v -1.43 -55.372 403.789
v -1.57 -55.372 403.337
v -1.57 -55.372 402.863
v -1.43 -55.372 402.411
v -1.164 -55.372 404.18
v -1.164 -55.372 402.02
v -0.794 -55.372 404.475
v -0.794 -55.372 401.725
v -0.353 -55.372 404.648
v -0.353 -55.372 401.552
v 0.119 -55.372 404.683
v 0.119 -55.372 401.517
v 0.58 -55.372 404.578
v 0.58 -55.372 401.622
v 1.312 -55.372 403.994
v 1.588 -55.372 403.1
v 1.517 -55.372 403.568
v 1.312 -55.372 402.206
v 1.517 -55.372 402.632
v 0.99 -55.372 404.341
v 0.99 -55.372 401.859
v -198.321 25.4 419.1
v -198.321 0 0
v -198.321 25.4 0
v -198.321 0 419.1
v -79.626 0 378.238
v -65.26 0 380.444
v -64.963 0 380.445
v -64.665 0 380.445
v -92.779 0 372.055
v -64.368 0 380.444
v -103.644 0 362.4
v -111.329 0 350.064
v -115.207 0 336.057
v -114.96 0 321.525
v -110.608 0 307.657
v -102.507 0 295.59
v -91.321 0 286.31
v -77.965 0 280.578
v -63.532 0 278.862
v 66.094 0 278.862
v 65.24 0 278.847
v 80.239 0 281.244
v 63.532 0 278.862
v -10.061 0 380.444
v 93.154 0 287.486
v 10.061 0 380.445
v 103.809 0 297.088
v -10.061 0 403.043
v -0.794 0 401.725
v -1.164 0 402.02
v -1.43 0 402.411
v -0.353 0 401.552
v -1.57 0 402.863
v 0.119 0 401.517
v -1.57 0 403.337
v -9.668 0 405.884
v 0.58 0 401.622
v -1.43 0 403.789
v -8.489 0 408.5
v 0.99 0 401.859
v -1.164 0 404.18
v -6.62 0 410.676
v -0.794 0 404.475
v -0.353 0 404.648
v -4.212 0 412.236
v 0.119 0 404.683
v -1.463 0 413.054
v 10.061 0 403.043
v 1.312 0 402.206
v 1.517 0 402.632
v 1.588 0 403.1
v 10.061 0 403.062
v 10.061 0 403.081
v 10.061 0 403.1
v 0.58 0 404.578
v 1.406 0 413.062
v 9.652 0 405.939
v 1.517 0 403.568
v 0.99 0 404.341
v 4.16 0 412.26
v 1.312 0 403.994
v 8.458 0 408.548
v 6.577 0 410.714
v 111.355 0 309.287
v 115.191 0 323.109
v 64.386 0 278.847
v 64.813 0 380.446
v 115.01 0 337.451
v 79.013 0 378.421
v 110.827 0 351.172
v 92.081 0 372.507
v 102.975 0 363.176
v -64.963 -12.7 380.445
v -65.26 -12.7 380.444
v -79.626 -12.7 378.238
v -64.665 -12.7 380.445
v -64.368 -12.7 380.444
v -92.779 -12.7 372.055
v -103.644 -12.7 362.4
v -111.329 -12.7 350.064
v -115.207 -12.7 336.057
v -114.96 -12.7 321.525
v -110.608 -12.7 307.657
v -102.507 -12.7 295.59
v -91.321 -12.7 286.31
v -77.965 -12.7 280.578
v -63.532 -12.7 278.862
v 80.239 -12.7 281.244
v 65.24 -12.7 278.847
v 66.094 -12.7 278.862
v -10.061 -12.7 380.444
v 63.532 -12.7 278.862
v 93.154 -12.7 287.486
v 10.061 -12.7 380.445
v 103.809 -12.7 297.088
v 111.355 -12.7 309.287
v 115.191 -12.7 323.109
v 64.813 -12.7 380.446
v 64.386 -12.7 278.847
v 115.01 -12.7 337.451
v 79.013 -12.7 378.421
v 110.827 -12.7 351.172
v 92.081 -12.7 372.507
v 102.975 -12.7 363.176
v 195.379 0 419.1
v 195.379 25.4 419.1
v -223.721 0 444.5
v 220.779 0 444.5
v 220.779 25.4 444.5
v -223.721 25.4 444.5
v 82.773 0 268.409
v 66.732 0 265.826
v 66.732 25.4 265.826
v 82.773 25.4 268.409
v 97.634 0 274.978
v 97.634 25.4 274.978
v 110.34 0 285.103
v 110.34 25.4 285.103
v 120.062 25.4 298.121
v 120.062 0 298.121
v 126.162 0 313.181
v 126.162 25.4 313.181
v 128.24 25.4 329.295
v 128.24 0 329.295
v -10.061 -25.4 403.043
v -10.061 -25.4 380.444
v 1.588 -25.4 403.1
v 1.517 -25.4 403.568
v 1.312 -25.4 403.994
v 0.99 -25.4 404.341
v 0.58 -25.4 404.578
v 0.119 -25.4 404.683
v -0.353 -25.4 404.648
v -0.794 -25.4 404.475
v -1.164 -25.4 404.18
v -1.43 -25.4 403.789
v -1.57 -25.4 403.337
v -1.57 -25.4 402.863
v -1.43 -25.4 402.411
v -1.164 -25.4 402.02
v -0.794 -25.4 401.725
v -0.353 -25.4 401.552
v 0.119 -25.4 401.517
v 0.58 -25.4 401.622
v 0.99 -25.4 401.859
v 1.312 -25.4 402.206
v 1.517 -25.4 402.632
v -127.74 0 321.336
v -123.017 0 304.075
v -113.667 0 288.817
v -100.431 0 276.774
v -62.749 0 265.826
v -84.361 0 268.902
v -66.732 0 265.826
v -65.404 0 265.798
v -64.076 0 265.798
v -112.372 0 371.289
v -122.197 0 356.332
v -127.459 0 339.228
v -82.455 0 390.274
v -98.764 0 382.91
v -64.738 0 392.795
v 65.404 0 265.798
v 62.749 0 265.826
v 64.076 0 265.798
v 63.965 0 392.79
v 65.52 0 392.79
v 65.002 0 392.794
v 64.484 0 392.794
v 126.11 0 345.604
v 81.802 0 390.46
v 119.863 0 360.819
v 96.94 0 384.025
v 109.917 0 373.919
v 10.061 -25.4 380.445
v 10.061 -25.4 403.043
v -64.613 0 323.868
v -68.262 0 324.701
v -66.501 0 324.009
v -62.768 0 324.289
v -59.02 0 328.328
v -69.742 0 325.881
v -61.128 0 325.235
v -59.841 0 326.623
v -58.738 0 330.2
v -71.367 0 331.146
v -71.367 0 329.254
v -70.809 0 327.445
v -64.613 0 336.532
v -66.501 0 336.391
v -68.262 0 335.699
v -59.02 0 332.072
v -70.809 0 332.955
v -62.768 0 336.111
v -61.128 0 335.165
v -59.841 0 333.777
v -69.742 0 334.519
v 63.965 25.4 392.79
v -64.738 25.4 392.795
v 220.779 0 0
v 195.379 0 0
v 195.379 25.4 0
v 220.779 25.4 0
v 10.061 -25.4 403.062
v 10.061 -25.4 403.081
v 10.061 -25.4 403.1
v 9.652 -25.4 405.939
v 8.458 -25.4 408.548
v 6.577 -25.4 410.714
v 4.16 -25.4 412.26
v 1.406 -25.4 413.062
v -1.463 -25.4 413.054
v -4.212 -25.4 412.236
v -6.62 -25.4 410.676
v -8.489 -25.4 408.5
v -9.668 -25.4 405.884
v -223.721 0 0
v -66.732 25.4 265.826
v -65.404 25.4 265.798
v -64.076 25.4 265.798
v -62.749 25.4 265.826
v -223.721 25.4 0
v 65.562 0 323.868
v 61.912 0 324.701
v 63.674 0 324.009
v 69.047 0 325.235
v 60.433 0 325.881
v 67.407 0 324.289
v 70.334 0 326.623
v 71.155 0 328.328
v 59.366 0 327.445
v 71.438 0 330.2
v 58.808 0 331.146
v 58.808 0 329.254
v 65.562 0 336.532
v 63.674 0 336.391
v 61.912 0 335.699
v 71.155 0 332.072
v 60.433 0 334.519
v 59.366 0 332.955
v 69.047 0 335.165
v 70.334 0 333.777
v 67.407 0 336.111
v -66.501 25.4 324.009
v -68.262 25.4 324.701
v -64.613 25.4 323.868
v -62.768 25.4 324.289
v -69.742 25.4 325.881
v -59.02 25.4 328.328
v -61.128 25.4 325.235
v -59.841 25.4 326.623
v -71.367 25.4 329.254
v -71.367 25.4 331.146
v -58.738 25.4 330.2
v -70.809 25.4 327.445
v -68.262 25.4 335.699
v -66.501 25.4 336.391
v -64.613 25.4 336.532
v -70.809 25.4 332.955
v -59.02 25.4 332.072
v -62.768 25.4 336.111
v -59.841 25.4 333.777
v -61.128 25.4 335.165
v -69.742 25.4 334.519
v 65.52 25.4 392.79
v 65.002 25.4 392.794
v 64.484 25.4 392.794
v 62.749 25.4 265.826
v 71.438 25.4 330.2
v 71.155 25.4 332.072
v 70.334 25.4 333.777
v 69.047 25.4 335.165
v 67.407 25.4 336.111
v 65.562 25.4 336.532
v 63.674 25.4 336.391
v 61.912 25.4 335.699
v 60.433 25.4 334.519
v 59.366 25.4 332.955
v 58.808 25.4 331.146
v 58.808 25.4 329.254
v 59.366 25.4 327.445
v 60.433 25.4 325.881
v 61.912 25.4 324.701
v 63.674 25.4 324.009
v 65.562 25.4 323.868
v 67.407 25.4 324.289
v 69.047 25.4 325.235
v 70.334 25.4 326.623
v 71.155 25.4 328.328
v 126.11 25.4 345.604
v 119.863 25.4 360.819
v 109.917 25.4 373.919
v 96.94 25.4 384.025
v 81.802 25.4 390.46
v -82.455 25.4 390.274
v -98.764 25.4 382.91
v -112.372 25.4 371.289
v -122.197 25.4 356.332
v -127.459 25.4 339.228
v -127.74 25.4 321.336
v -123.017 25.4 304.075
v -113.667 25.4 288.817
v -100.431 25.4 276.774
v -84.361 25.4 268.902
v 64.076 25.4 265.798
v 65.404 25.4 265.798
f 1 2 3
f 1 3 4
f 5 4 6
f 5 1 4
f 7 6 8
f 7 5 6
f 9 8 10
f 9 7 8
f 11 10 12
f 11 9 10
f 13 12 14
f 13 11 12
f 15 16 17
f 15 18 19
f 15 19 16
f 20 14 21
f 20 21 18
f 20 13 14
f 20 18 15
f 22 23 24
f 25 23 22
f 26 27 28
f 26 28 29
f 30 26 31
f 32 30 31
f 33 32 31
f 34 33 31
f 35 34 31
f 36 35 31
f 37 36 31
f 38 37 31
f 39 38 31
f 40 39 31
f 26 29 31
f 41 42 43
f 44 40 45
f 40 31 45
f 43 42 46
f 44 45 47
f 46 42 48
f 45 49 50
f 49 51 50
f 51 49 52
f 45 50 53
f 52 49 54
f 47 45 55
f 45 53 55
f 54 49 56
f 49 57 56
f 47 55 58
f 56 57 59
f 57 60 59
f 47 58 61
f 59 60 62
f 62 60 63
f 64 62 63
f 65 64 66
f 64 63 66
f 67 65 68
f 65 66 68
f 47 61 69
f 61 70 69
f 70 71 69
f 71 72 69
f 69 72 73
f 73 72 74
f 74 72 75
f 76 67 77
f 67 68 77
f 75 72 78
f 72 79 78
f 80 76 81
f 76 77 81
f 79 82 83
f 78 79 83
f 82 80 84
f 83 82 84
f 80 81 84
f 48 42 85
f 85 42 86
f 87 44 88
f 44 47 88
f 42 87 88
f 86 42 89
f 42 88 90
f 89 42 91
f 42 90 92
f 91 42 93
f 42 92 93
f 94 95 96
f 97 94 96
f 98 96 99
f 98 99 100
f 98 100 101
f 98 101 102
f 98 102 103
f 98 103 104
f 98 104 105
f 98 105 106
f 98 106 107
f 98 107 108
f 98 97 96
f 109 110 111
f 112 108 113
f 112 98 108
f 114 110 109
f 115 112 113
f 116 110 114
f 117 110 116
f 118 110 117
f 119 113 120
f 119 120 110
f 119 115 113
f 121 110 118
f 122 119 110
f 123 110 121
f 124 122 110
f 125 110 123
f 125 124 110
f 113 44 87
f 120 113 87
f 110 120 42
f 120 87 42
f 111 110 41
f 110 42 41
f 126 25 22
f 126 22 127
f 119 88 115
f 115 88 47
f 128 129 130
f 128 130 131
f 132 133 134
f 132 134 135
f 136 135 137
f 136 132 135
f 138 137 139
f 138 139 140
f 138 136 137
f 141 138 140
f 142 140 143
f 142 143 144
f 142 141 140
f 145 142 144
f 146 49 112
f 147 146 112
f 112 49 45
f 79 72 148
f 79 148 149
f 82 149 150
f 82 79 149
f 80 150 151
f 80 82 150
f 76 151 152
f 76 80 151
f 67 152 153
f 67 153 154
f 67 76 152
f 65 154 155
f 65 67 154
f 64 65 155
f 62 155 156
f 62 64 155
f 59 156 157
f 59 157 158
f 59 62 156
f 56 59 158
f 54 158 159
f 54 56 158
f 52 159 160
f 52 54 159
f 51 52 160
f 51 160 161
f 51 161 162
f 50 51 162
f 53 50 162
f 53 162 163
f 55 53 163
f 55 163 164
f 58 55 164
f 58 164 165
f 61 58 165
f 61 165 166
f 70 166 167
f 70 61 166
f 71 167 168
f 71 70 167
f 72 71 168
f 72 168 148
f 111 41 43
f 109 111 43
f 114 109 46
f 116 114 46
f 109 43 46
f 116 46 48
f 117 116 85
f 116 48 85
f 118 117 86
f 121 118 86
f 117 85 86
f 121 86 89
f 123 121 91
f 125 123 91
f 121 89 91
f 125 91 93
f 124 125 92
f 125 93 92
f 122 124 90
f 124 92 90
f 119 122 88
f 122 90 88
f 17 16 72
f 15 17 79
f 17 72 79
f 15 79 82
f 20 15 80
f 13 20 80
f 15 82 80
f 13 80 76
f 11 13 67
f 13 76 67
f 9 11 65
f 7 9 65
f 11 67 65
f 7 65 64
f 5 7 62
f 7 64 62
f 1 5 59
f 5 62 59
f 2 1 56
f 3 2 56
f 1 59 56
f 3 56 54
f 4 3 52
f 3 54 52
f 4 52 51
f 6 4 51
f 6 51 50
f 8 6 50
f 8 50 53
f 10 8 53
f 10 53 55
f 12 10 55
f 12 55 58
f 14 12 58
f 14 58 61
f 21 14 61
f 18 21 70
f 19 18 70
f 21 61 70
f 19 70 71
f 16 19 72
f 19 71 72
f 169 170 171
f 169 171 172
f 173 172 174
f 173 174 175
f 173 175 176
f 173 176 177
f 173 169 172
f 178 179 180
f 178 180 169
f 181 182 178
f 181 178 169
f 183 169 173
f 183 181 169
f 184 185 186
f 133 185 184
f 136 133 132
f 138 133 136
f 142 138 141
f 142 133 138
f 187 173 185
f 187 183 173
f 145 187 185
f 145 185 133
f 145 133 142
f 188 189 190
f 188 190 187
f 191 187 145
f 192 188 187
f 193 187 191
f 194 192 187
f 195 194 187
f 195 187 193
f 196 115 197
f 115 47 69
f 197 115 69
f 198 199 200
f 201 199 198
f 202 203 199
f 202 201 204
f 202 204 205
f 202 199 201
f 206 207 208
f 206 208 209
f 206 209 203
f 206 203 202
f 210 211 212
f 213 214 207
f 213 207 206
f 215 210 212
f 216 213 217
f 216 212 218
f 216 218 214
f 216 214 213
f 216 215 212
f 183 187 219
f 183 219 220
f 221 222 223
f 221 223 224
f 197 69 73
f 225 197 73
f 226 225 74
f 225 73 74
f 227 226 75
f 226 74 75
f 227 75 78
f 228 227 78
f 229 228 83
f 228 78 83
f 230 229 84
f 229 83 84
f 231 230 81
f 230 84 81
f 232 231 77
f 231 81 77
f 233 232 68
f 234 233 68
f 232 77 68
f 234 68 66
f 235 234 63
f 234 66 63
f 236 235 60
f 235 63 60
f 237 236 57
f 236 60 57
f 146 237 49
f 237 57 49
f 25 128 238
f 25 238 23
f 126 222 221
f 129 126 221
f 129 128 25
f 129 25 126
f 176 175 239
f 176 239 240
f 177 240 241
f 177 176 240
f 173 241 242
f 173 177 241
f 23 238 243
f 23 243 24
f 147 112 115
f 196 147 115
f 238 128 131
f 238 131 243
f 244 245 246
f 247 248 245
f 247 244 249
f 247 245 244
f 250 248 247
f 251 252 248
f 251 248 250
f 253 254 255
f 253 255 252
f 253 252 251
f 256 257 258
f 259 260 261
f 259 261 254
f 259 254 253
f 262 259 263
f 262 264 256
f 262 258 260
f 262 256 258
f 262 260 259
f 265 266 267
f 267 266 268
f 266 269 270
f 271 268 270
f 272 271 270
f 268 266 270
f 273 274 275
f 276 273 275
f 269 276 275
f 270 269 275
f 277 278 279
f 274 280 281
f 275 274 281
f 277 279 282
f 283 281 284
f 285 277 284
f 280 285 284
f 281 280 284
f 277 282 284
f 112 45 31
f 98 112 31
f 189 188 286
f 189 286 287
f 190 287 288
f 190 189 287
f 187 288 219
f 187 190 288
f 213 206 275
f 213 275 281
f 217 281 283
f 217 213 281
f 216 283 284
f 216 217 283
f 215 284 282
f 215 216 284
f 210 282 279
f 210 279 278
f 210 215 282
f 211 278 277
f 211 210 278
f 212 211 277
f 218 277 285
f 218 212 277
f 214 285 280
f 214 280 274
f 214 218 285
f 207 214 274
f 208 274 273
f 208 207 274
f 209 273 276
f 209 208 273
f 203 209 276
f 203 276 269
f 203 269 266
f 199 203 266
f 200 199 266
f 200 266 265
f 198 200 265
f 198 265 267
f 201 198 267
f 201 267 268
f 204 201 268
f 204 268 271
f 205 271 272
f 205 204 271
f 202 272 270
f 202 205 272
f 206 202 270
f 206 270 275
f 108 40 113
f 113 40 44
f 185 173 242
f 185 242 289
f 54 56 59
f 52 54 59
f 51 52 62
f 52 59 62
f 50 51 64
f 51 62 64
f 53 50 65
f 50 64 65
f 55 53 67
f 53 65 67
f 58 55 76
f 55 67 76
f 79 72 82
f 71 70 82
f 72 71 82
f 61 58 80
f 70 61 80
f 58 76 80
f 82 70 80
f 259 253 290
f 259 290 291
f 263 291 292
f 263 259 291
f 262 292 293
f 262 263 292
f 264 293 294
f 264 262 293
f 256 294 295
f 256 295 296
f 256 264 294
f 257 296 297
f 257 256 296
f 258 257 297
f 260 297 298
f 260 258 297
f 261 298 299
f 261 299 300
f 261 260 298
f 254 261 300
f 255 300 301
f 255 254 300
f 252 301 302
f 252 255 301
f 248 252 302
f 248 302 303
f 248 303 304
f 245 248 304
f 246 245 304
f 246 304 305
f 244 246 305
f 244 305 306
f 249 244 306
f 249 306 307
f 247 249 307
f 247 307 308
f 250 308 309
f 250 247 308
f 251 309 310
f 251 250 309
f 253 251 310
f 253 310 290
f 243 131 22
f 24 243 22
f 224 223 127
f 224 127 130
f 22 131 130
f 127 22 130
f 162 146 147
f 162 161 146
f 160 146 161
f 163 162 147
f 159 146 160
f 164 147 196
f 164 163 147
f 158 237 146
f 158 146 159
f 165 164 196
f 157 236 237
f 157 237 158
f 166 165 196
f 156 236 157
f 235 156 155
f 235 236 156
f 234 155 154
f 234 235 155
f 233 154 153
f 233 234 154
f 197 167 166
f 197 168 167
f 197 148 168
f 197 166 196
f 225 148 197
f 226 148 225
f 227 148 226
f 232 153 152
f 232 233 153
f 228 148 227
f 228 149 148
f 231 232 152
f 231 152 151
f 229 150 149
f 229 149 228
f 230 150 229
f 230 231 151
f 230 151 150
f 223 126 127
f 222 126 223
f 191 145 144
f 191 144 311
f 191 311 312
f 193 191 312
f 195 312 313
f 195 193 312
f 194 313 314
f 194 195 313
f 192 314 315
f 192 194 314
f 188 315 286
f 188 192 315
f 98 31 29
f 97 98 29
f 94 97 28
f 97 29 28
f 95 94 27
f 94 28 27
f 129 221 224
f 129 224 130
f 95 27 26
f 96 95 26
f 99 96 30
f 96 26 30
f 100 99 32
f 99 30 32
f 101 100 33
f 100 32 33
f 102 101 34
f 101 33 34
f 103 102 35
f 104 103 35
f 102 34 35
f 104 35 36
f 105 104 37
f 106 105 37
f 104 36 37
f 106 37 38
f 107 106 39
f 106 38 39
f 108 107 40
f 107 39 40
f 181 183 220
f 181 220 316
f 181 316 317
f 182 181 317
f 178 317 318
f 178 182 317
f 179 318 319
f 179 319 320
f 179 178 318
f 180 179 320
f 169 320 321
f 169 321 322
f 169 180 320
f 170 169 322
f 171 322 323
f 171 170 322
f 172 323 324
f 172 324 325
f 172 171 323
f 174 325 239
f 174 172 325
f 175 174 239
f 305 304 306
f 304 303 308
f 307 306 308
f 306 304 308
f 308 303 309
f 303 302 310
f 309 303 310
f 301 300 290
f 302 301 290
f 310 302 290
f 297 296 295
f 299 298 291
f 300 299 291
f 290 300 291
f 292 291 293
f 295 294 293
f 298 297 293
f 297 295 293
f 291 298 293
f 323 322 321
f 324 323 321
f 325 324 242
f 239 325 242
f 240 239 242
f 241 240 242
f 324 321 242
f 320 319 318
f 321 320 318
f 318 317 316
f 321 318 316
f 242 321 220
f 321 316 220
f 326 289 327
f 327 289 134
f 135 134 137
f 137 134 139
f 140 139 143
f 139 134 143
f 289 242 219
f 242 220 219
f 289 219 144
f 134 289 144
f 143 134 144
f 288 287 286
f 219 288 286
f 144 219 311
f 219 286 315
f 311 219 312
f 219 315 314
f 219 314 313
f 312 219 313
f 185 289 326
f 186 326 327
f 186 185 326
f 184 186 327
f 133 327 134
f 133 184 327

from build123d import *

# Parameters (mm, degrees)
F1_DEPTH = 25.4
F2_R     = 6.35
F3_DEPTH = 12.7
F2_R_2   = 1.5875
F4_DEPTH = 25.4
F5_DEPTH = 55.372
F6_DEPTH = 25.4
F8_DEPTH = 25.4


with BuildPart() as f1:
    # F0 (on Front) → F1 (new body)
    with BuildSketch(Plane.XZ):
        Polygon((220.7794714003, 444.5), (-223.7205285997, 444.5), (-223.7205285997, 0), (-198.3205285997, 0), (-198.3205285997, 419.1), (195.3794714003, 419.1), (195.3794714003, 0), (220.7794714003, 0), align=None)
    extrude(amount=-F1_DEPTH)


with BuildPart() as f3:
    # F2 (on face) → F3 (new body)
    with BuildSketch(Plane.XZ):
        with BuildLine():
            Line((-65.2600586708, 380.4436114409), (-64.3680339263, 380.4436249147))
            ThreePointArc((-64.3680339263, 380.4436249147), (-64.8140463281, 380.4455761588), (-65.2600586708, 380.4436114409))
        make_face()
        with BuildLine():
            Line((-10.0605708618, 380.4444452172), (-64.3680339263, 380.4436249147))
            Line((-64.3680339263, 380.4436249147), (-65.2600586708, 380.4436114409))
            ThreePointArc((-65.2600586708, 380.4436114409), (-115.6059339898, 328.7817476998), (-63.532459971, 278.8617253594))
            Line((-63.532459971, 278.8617253594), (63.532459971, 278.8617253594))
            Line((63.532459971, 278.8617253594), (66.0940980393, 278.8617253594))
            ThreePointArc((66.0940980393, 278.8617253594), (115.6092367076, 330.2864202149), (64.8125116822, 380.4455761588))
            Line((64.8125116822, 380.4455761588), (10.060519749, 380.4447491419))
            Line((10.060519749, 380.4447491419), (10.060519749, 330.9917804861))
            ThreePointArc((10.060519749, 330.9917804861), (10.0606420697, 330.963137726), (10.0606828434, 330.9344947338))
            ThreePointArc((10.0606828434, 330.9344947338), (10.0606420697, 330.9058517416), (10.060519749, 330.8772089815))
            ThreePointArc((10.060519749, 330.8772089815), (-0.0286543698, 320.8738526965), (-10.0606828434, 330.9345174891))
            Line((-10.0606828434, 330.9345174891), (-10.0605708618, 380.4444452172))
        make_face()
        with Locations((-65.0875, 330.2)):
            Circle(F2_R, mode=Mode.SUBTRACT)
        with Locations((65.0875, 330.2)):
            Circle(F2_R, mode=Mode.SUBTRACT)
        with BuildLine():
            Line((10.060519749, 380.4447491419), (-10.0605708618, 380.4444452172))
            Line((-10.0605708618, 380.4444452172), (-10.0606828434, 330.9345174891))
            ThreePointArc((-10.0606828434, 330.9345174891), (-0.0286316146, 340.9951368359), (10.060519749, 330.9917804861))
            Line((10.060519749, 330.9917804861), (10.060519749, 380.4447491419))
        make_face()
        with BuildLine():
            ThreePointArc((10.060519749, 330.9917804861), (-0.0286316146, 340.9951368359), (-10.0606828434, 330.9345174891))
            ThreePointArc((-10.0606828434, 330.9345174891), (-0.0286543698, 320.8738526965), (10.060519749, 330.8772089815))
            Line((10.060519749, 330.8772089815), (10.060519749, 330.9917804861))
        make_face()
        with BuildLine():
            Line((66.0940980393, 278.8617253594), (63.532459971, 278.8617253594))
            ThreePointArc((63.532459971, 278.8617253594), (64.8132790052, 278.8455761646), (66.0940980393, 278.8617253594))
        make_face()
        with BuildLine():
            ThreePointArc((10.0606828434, 330.9344947338), (10.0606420697, 330.963137726), (10.060519749, 330.9917804861))
            Line((10.060519749, 330.9917804861), (10.060519749, 330.8772089815))
            ThreePointArc((10.060519749, 330.8772089815), (10.0606420697, 330.9058517416), (10.0606828434, 330.9344947338))
        make_face()
        with Locations((-65.0875, 330.2)):
            Circle(F2_R)
        with Locations((65.0875, 330.2)):
            Circle(F2_R)
    extrude(amount=F3_DEPTH)

    # F2 (on face) → F4 (join)
    with BuildSketch(Plane.XZ):
        with BuildLine():
            Line((-10.060519749, 403.0427142477), (-10.0605708618, 380.4444452172))
            Line((-10.0605708618, 380.4444452172), (10.060519749, 380.4447491419))
            Line((10.060519749, 380.4447491419), (10.060519749, 403.0427142477))
            ThreePointArc((10.060519749, 403.0427142477), (0, 393.0393171566), (-10.060519749, 403.0427142477))
        make_face()
        with BuildLine():
            ThreePointArc((10.0606828434, 403.1), (-0.0286429922, 413.1606420697), (-10.060519749, 403.0427142477))
            ThreePointArc((-10.060519749, 403.0427142477), (0, 393.0393171566), (10.060519749, 403.0427142477))
            ThreePointArc((10.060519749, 403.0427142477), (10.0606420697, 403.0713570078), (10.0606828434, 403.1))
        make_face()
        with Locations((0, 403.1)):
            Circle(F2_R_2, mode=Mode.SUBTRACT)
    extrude(amount=F4_DEPTH)


with BuildPart() as f5:
    # F2 (on face) → F5 (new body)
    with BuildSketch(Plane.XZ):
        with Locations((0, 403.1)):
            Circle(F2_R_2)
    extrude(amount=F5_DEPTH)


with BuildPart() as f6:
    # F2 (on face) → F6 (new body)
    with BuildSketch(Plane.XZ):
        with Locations((65.0875, 330.2)):
            Circle(F2_R)
    extrude(amount=-F6_DEPTH)


with BuildPart() as f6b:
    # F2 (on face) → F6, piece 2 (new body)
    with BuildSketch(Plane.XZ):
        with Locations((-65.0875, 330.2)):
            Circle(F2_R)
    extrude(amount=-F6_DEPTH)


with BuildPart() as f8:
    # F7 (on face) → F8 (new body)
    with BuildSketch(Plane.XZ):
        with BuildLine():
            ThreePointArc((66.7321972552, 265.8258956615), (110.3404918101, 285.1031653263), (128.2404640913, 329.2946517467))
            ThreePointArc((128.2404640913, 329.2946517467), (109.916593326, 373.9193909323), (65.5202326779, 392.7898638572))
            Line((65.5202326779, 392.7898638572), (63.9653632353, 392.7899210088))
            ThreePointArc((63.9653632353, 392.7899210088), (1.24337931, 329.9031123291), (62.7487309274, 265.8258956615))
            Line((62.7487309274, 265.8258956615), (66.7321972552, 265.8258956615))
        make_face()
        with BuildLine():
            Line((63.9653632353, 392.7899210088), (65.5202326779, 392.7898638572))
            ThreePointArc((65.5202326779, 392.7898638572), (64.7427981316, 392.7946517039), (63.9653632353, 392.7899210088))
        make_face()
        with BuildLine():
            ThreePointArc((62.7487309274, 265.8258956615), (64.7404640913, 265.7946517467), (66.7321972552, 265.8258956615))
            Line((66.7321972552, 265.8258956615), (62.7487309274, 265.8258956615))
        make_face()
        with BuildLine():
            ThreePointArc((62.7487309274, 265.8258956615), (1.24337931, 329.9031123291), (63.9653632353, 392.7899210088))
            Line((63.9653632353, 392.7899210088), (-64.738130051, 392.7946517039))
            ThreePointArc((-64.738130051, 392.7946517039), (-19.8383582857, 374.1951071367), (-1.2404640913, 329.2946517467))
            ThreePointArc((-1.2404640913, 329.2946517467), (-19.1404363725, 285.1031653263), (-62.7487309274, 265.8258956615))
            Line((-62.7487309274, 265.8258956615), (62.7487309274, 265.8258956615))
        make_face()
        with BuildLine():
            ThreePointArc((-1.2404640913, 329.2946517467), (-19.8383582857, 374.1951071367), (-64.738130051, 392.7946517039))
            ThreePointArc((-64.738130051, 392.7946517039), (-128.2326343169, 330.2918077268), (-66.7321972552, 265.8258956615))
            Line((-66.7321972552, 265.8258956615), (-62.7487309274, 265.8258956615))
            ThreePointArc((-62.7487309274, 265.8258956615), (-19.1404363725, 285.1031653263), (-1.2404640913, 329.2946517467))
        make_face()
        with BuildLine():
            ThreePointArc((-66.7321972552, 265.8258956615), (-64.7404640913, 265.7946517467), (-62.7487309274, 265.8258956615))
            Line((-62.7487309274, 265.8258956615), (-66.7321972552, 265.8258956615))
        make_face()
    extrude(amount=-F8_DEPTH)


solid = Compound([f1.part, f3.part, f5.part, f6.part, f6b.part, f8.part])
